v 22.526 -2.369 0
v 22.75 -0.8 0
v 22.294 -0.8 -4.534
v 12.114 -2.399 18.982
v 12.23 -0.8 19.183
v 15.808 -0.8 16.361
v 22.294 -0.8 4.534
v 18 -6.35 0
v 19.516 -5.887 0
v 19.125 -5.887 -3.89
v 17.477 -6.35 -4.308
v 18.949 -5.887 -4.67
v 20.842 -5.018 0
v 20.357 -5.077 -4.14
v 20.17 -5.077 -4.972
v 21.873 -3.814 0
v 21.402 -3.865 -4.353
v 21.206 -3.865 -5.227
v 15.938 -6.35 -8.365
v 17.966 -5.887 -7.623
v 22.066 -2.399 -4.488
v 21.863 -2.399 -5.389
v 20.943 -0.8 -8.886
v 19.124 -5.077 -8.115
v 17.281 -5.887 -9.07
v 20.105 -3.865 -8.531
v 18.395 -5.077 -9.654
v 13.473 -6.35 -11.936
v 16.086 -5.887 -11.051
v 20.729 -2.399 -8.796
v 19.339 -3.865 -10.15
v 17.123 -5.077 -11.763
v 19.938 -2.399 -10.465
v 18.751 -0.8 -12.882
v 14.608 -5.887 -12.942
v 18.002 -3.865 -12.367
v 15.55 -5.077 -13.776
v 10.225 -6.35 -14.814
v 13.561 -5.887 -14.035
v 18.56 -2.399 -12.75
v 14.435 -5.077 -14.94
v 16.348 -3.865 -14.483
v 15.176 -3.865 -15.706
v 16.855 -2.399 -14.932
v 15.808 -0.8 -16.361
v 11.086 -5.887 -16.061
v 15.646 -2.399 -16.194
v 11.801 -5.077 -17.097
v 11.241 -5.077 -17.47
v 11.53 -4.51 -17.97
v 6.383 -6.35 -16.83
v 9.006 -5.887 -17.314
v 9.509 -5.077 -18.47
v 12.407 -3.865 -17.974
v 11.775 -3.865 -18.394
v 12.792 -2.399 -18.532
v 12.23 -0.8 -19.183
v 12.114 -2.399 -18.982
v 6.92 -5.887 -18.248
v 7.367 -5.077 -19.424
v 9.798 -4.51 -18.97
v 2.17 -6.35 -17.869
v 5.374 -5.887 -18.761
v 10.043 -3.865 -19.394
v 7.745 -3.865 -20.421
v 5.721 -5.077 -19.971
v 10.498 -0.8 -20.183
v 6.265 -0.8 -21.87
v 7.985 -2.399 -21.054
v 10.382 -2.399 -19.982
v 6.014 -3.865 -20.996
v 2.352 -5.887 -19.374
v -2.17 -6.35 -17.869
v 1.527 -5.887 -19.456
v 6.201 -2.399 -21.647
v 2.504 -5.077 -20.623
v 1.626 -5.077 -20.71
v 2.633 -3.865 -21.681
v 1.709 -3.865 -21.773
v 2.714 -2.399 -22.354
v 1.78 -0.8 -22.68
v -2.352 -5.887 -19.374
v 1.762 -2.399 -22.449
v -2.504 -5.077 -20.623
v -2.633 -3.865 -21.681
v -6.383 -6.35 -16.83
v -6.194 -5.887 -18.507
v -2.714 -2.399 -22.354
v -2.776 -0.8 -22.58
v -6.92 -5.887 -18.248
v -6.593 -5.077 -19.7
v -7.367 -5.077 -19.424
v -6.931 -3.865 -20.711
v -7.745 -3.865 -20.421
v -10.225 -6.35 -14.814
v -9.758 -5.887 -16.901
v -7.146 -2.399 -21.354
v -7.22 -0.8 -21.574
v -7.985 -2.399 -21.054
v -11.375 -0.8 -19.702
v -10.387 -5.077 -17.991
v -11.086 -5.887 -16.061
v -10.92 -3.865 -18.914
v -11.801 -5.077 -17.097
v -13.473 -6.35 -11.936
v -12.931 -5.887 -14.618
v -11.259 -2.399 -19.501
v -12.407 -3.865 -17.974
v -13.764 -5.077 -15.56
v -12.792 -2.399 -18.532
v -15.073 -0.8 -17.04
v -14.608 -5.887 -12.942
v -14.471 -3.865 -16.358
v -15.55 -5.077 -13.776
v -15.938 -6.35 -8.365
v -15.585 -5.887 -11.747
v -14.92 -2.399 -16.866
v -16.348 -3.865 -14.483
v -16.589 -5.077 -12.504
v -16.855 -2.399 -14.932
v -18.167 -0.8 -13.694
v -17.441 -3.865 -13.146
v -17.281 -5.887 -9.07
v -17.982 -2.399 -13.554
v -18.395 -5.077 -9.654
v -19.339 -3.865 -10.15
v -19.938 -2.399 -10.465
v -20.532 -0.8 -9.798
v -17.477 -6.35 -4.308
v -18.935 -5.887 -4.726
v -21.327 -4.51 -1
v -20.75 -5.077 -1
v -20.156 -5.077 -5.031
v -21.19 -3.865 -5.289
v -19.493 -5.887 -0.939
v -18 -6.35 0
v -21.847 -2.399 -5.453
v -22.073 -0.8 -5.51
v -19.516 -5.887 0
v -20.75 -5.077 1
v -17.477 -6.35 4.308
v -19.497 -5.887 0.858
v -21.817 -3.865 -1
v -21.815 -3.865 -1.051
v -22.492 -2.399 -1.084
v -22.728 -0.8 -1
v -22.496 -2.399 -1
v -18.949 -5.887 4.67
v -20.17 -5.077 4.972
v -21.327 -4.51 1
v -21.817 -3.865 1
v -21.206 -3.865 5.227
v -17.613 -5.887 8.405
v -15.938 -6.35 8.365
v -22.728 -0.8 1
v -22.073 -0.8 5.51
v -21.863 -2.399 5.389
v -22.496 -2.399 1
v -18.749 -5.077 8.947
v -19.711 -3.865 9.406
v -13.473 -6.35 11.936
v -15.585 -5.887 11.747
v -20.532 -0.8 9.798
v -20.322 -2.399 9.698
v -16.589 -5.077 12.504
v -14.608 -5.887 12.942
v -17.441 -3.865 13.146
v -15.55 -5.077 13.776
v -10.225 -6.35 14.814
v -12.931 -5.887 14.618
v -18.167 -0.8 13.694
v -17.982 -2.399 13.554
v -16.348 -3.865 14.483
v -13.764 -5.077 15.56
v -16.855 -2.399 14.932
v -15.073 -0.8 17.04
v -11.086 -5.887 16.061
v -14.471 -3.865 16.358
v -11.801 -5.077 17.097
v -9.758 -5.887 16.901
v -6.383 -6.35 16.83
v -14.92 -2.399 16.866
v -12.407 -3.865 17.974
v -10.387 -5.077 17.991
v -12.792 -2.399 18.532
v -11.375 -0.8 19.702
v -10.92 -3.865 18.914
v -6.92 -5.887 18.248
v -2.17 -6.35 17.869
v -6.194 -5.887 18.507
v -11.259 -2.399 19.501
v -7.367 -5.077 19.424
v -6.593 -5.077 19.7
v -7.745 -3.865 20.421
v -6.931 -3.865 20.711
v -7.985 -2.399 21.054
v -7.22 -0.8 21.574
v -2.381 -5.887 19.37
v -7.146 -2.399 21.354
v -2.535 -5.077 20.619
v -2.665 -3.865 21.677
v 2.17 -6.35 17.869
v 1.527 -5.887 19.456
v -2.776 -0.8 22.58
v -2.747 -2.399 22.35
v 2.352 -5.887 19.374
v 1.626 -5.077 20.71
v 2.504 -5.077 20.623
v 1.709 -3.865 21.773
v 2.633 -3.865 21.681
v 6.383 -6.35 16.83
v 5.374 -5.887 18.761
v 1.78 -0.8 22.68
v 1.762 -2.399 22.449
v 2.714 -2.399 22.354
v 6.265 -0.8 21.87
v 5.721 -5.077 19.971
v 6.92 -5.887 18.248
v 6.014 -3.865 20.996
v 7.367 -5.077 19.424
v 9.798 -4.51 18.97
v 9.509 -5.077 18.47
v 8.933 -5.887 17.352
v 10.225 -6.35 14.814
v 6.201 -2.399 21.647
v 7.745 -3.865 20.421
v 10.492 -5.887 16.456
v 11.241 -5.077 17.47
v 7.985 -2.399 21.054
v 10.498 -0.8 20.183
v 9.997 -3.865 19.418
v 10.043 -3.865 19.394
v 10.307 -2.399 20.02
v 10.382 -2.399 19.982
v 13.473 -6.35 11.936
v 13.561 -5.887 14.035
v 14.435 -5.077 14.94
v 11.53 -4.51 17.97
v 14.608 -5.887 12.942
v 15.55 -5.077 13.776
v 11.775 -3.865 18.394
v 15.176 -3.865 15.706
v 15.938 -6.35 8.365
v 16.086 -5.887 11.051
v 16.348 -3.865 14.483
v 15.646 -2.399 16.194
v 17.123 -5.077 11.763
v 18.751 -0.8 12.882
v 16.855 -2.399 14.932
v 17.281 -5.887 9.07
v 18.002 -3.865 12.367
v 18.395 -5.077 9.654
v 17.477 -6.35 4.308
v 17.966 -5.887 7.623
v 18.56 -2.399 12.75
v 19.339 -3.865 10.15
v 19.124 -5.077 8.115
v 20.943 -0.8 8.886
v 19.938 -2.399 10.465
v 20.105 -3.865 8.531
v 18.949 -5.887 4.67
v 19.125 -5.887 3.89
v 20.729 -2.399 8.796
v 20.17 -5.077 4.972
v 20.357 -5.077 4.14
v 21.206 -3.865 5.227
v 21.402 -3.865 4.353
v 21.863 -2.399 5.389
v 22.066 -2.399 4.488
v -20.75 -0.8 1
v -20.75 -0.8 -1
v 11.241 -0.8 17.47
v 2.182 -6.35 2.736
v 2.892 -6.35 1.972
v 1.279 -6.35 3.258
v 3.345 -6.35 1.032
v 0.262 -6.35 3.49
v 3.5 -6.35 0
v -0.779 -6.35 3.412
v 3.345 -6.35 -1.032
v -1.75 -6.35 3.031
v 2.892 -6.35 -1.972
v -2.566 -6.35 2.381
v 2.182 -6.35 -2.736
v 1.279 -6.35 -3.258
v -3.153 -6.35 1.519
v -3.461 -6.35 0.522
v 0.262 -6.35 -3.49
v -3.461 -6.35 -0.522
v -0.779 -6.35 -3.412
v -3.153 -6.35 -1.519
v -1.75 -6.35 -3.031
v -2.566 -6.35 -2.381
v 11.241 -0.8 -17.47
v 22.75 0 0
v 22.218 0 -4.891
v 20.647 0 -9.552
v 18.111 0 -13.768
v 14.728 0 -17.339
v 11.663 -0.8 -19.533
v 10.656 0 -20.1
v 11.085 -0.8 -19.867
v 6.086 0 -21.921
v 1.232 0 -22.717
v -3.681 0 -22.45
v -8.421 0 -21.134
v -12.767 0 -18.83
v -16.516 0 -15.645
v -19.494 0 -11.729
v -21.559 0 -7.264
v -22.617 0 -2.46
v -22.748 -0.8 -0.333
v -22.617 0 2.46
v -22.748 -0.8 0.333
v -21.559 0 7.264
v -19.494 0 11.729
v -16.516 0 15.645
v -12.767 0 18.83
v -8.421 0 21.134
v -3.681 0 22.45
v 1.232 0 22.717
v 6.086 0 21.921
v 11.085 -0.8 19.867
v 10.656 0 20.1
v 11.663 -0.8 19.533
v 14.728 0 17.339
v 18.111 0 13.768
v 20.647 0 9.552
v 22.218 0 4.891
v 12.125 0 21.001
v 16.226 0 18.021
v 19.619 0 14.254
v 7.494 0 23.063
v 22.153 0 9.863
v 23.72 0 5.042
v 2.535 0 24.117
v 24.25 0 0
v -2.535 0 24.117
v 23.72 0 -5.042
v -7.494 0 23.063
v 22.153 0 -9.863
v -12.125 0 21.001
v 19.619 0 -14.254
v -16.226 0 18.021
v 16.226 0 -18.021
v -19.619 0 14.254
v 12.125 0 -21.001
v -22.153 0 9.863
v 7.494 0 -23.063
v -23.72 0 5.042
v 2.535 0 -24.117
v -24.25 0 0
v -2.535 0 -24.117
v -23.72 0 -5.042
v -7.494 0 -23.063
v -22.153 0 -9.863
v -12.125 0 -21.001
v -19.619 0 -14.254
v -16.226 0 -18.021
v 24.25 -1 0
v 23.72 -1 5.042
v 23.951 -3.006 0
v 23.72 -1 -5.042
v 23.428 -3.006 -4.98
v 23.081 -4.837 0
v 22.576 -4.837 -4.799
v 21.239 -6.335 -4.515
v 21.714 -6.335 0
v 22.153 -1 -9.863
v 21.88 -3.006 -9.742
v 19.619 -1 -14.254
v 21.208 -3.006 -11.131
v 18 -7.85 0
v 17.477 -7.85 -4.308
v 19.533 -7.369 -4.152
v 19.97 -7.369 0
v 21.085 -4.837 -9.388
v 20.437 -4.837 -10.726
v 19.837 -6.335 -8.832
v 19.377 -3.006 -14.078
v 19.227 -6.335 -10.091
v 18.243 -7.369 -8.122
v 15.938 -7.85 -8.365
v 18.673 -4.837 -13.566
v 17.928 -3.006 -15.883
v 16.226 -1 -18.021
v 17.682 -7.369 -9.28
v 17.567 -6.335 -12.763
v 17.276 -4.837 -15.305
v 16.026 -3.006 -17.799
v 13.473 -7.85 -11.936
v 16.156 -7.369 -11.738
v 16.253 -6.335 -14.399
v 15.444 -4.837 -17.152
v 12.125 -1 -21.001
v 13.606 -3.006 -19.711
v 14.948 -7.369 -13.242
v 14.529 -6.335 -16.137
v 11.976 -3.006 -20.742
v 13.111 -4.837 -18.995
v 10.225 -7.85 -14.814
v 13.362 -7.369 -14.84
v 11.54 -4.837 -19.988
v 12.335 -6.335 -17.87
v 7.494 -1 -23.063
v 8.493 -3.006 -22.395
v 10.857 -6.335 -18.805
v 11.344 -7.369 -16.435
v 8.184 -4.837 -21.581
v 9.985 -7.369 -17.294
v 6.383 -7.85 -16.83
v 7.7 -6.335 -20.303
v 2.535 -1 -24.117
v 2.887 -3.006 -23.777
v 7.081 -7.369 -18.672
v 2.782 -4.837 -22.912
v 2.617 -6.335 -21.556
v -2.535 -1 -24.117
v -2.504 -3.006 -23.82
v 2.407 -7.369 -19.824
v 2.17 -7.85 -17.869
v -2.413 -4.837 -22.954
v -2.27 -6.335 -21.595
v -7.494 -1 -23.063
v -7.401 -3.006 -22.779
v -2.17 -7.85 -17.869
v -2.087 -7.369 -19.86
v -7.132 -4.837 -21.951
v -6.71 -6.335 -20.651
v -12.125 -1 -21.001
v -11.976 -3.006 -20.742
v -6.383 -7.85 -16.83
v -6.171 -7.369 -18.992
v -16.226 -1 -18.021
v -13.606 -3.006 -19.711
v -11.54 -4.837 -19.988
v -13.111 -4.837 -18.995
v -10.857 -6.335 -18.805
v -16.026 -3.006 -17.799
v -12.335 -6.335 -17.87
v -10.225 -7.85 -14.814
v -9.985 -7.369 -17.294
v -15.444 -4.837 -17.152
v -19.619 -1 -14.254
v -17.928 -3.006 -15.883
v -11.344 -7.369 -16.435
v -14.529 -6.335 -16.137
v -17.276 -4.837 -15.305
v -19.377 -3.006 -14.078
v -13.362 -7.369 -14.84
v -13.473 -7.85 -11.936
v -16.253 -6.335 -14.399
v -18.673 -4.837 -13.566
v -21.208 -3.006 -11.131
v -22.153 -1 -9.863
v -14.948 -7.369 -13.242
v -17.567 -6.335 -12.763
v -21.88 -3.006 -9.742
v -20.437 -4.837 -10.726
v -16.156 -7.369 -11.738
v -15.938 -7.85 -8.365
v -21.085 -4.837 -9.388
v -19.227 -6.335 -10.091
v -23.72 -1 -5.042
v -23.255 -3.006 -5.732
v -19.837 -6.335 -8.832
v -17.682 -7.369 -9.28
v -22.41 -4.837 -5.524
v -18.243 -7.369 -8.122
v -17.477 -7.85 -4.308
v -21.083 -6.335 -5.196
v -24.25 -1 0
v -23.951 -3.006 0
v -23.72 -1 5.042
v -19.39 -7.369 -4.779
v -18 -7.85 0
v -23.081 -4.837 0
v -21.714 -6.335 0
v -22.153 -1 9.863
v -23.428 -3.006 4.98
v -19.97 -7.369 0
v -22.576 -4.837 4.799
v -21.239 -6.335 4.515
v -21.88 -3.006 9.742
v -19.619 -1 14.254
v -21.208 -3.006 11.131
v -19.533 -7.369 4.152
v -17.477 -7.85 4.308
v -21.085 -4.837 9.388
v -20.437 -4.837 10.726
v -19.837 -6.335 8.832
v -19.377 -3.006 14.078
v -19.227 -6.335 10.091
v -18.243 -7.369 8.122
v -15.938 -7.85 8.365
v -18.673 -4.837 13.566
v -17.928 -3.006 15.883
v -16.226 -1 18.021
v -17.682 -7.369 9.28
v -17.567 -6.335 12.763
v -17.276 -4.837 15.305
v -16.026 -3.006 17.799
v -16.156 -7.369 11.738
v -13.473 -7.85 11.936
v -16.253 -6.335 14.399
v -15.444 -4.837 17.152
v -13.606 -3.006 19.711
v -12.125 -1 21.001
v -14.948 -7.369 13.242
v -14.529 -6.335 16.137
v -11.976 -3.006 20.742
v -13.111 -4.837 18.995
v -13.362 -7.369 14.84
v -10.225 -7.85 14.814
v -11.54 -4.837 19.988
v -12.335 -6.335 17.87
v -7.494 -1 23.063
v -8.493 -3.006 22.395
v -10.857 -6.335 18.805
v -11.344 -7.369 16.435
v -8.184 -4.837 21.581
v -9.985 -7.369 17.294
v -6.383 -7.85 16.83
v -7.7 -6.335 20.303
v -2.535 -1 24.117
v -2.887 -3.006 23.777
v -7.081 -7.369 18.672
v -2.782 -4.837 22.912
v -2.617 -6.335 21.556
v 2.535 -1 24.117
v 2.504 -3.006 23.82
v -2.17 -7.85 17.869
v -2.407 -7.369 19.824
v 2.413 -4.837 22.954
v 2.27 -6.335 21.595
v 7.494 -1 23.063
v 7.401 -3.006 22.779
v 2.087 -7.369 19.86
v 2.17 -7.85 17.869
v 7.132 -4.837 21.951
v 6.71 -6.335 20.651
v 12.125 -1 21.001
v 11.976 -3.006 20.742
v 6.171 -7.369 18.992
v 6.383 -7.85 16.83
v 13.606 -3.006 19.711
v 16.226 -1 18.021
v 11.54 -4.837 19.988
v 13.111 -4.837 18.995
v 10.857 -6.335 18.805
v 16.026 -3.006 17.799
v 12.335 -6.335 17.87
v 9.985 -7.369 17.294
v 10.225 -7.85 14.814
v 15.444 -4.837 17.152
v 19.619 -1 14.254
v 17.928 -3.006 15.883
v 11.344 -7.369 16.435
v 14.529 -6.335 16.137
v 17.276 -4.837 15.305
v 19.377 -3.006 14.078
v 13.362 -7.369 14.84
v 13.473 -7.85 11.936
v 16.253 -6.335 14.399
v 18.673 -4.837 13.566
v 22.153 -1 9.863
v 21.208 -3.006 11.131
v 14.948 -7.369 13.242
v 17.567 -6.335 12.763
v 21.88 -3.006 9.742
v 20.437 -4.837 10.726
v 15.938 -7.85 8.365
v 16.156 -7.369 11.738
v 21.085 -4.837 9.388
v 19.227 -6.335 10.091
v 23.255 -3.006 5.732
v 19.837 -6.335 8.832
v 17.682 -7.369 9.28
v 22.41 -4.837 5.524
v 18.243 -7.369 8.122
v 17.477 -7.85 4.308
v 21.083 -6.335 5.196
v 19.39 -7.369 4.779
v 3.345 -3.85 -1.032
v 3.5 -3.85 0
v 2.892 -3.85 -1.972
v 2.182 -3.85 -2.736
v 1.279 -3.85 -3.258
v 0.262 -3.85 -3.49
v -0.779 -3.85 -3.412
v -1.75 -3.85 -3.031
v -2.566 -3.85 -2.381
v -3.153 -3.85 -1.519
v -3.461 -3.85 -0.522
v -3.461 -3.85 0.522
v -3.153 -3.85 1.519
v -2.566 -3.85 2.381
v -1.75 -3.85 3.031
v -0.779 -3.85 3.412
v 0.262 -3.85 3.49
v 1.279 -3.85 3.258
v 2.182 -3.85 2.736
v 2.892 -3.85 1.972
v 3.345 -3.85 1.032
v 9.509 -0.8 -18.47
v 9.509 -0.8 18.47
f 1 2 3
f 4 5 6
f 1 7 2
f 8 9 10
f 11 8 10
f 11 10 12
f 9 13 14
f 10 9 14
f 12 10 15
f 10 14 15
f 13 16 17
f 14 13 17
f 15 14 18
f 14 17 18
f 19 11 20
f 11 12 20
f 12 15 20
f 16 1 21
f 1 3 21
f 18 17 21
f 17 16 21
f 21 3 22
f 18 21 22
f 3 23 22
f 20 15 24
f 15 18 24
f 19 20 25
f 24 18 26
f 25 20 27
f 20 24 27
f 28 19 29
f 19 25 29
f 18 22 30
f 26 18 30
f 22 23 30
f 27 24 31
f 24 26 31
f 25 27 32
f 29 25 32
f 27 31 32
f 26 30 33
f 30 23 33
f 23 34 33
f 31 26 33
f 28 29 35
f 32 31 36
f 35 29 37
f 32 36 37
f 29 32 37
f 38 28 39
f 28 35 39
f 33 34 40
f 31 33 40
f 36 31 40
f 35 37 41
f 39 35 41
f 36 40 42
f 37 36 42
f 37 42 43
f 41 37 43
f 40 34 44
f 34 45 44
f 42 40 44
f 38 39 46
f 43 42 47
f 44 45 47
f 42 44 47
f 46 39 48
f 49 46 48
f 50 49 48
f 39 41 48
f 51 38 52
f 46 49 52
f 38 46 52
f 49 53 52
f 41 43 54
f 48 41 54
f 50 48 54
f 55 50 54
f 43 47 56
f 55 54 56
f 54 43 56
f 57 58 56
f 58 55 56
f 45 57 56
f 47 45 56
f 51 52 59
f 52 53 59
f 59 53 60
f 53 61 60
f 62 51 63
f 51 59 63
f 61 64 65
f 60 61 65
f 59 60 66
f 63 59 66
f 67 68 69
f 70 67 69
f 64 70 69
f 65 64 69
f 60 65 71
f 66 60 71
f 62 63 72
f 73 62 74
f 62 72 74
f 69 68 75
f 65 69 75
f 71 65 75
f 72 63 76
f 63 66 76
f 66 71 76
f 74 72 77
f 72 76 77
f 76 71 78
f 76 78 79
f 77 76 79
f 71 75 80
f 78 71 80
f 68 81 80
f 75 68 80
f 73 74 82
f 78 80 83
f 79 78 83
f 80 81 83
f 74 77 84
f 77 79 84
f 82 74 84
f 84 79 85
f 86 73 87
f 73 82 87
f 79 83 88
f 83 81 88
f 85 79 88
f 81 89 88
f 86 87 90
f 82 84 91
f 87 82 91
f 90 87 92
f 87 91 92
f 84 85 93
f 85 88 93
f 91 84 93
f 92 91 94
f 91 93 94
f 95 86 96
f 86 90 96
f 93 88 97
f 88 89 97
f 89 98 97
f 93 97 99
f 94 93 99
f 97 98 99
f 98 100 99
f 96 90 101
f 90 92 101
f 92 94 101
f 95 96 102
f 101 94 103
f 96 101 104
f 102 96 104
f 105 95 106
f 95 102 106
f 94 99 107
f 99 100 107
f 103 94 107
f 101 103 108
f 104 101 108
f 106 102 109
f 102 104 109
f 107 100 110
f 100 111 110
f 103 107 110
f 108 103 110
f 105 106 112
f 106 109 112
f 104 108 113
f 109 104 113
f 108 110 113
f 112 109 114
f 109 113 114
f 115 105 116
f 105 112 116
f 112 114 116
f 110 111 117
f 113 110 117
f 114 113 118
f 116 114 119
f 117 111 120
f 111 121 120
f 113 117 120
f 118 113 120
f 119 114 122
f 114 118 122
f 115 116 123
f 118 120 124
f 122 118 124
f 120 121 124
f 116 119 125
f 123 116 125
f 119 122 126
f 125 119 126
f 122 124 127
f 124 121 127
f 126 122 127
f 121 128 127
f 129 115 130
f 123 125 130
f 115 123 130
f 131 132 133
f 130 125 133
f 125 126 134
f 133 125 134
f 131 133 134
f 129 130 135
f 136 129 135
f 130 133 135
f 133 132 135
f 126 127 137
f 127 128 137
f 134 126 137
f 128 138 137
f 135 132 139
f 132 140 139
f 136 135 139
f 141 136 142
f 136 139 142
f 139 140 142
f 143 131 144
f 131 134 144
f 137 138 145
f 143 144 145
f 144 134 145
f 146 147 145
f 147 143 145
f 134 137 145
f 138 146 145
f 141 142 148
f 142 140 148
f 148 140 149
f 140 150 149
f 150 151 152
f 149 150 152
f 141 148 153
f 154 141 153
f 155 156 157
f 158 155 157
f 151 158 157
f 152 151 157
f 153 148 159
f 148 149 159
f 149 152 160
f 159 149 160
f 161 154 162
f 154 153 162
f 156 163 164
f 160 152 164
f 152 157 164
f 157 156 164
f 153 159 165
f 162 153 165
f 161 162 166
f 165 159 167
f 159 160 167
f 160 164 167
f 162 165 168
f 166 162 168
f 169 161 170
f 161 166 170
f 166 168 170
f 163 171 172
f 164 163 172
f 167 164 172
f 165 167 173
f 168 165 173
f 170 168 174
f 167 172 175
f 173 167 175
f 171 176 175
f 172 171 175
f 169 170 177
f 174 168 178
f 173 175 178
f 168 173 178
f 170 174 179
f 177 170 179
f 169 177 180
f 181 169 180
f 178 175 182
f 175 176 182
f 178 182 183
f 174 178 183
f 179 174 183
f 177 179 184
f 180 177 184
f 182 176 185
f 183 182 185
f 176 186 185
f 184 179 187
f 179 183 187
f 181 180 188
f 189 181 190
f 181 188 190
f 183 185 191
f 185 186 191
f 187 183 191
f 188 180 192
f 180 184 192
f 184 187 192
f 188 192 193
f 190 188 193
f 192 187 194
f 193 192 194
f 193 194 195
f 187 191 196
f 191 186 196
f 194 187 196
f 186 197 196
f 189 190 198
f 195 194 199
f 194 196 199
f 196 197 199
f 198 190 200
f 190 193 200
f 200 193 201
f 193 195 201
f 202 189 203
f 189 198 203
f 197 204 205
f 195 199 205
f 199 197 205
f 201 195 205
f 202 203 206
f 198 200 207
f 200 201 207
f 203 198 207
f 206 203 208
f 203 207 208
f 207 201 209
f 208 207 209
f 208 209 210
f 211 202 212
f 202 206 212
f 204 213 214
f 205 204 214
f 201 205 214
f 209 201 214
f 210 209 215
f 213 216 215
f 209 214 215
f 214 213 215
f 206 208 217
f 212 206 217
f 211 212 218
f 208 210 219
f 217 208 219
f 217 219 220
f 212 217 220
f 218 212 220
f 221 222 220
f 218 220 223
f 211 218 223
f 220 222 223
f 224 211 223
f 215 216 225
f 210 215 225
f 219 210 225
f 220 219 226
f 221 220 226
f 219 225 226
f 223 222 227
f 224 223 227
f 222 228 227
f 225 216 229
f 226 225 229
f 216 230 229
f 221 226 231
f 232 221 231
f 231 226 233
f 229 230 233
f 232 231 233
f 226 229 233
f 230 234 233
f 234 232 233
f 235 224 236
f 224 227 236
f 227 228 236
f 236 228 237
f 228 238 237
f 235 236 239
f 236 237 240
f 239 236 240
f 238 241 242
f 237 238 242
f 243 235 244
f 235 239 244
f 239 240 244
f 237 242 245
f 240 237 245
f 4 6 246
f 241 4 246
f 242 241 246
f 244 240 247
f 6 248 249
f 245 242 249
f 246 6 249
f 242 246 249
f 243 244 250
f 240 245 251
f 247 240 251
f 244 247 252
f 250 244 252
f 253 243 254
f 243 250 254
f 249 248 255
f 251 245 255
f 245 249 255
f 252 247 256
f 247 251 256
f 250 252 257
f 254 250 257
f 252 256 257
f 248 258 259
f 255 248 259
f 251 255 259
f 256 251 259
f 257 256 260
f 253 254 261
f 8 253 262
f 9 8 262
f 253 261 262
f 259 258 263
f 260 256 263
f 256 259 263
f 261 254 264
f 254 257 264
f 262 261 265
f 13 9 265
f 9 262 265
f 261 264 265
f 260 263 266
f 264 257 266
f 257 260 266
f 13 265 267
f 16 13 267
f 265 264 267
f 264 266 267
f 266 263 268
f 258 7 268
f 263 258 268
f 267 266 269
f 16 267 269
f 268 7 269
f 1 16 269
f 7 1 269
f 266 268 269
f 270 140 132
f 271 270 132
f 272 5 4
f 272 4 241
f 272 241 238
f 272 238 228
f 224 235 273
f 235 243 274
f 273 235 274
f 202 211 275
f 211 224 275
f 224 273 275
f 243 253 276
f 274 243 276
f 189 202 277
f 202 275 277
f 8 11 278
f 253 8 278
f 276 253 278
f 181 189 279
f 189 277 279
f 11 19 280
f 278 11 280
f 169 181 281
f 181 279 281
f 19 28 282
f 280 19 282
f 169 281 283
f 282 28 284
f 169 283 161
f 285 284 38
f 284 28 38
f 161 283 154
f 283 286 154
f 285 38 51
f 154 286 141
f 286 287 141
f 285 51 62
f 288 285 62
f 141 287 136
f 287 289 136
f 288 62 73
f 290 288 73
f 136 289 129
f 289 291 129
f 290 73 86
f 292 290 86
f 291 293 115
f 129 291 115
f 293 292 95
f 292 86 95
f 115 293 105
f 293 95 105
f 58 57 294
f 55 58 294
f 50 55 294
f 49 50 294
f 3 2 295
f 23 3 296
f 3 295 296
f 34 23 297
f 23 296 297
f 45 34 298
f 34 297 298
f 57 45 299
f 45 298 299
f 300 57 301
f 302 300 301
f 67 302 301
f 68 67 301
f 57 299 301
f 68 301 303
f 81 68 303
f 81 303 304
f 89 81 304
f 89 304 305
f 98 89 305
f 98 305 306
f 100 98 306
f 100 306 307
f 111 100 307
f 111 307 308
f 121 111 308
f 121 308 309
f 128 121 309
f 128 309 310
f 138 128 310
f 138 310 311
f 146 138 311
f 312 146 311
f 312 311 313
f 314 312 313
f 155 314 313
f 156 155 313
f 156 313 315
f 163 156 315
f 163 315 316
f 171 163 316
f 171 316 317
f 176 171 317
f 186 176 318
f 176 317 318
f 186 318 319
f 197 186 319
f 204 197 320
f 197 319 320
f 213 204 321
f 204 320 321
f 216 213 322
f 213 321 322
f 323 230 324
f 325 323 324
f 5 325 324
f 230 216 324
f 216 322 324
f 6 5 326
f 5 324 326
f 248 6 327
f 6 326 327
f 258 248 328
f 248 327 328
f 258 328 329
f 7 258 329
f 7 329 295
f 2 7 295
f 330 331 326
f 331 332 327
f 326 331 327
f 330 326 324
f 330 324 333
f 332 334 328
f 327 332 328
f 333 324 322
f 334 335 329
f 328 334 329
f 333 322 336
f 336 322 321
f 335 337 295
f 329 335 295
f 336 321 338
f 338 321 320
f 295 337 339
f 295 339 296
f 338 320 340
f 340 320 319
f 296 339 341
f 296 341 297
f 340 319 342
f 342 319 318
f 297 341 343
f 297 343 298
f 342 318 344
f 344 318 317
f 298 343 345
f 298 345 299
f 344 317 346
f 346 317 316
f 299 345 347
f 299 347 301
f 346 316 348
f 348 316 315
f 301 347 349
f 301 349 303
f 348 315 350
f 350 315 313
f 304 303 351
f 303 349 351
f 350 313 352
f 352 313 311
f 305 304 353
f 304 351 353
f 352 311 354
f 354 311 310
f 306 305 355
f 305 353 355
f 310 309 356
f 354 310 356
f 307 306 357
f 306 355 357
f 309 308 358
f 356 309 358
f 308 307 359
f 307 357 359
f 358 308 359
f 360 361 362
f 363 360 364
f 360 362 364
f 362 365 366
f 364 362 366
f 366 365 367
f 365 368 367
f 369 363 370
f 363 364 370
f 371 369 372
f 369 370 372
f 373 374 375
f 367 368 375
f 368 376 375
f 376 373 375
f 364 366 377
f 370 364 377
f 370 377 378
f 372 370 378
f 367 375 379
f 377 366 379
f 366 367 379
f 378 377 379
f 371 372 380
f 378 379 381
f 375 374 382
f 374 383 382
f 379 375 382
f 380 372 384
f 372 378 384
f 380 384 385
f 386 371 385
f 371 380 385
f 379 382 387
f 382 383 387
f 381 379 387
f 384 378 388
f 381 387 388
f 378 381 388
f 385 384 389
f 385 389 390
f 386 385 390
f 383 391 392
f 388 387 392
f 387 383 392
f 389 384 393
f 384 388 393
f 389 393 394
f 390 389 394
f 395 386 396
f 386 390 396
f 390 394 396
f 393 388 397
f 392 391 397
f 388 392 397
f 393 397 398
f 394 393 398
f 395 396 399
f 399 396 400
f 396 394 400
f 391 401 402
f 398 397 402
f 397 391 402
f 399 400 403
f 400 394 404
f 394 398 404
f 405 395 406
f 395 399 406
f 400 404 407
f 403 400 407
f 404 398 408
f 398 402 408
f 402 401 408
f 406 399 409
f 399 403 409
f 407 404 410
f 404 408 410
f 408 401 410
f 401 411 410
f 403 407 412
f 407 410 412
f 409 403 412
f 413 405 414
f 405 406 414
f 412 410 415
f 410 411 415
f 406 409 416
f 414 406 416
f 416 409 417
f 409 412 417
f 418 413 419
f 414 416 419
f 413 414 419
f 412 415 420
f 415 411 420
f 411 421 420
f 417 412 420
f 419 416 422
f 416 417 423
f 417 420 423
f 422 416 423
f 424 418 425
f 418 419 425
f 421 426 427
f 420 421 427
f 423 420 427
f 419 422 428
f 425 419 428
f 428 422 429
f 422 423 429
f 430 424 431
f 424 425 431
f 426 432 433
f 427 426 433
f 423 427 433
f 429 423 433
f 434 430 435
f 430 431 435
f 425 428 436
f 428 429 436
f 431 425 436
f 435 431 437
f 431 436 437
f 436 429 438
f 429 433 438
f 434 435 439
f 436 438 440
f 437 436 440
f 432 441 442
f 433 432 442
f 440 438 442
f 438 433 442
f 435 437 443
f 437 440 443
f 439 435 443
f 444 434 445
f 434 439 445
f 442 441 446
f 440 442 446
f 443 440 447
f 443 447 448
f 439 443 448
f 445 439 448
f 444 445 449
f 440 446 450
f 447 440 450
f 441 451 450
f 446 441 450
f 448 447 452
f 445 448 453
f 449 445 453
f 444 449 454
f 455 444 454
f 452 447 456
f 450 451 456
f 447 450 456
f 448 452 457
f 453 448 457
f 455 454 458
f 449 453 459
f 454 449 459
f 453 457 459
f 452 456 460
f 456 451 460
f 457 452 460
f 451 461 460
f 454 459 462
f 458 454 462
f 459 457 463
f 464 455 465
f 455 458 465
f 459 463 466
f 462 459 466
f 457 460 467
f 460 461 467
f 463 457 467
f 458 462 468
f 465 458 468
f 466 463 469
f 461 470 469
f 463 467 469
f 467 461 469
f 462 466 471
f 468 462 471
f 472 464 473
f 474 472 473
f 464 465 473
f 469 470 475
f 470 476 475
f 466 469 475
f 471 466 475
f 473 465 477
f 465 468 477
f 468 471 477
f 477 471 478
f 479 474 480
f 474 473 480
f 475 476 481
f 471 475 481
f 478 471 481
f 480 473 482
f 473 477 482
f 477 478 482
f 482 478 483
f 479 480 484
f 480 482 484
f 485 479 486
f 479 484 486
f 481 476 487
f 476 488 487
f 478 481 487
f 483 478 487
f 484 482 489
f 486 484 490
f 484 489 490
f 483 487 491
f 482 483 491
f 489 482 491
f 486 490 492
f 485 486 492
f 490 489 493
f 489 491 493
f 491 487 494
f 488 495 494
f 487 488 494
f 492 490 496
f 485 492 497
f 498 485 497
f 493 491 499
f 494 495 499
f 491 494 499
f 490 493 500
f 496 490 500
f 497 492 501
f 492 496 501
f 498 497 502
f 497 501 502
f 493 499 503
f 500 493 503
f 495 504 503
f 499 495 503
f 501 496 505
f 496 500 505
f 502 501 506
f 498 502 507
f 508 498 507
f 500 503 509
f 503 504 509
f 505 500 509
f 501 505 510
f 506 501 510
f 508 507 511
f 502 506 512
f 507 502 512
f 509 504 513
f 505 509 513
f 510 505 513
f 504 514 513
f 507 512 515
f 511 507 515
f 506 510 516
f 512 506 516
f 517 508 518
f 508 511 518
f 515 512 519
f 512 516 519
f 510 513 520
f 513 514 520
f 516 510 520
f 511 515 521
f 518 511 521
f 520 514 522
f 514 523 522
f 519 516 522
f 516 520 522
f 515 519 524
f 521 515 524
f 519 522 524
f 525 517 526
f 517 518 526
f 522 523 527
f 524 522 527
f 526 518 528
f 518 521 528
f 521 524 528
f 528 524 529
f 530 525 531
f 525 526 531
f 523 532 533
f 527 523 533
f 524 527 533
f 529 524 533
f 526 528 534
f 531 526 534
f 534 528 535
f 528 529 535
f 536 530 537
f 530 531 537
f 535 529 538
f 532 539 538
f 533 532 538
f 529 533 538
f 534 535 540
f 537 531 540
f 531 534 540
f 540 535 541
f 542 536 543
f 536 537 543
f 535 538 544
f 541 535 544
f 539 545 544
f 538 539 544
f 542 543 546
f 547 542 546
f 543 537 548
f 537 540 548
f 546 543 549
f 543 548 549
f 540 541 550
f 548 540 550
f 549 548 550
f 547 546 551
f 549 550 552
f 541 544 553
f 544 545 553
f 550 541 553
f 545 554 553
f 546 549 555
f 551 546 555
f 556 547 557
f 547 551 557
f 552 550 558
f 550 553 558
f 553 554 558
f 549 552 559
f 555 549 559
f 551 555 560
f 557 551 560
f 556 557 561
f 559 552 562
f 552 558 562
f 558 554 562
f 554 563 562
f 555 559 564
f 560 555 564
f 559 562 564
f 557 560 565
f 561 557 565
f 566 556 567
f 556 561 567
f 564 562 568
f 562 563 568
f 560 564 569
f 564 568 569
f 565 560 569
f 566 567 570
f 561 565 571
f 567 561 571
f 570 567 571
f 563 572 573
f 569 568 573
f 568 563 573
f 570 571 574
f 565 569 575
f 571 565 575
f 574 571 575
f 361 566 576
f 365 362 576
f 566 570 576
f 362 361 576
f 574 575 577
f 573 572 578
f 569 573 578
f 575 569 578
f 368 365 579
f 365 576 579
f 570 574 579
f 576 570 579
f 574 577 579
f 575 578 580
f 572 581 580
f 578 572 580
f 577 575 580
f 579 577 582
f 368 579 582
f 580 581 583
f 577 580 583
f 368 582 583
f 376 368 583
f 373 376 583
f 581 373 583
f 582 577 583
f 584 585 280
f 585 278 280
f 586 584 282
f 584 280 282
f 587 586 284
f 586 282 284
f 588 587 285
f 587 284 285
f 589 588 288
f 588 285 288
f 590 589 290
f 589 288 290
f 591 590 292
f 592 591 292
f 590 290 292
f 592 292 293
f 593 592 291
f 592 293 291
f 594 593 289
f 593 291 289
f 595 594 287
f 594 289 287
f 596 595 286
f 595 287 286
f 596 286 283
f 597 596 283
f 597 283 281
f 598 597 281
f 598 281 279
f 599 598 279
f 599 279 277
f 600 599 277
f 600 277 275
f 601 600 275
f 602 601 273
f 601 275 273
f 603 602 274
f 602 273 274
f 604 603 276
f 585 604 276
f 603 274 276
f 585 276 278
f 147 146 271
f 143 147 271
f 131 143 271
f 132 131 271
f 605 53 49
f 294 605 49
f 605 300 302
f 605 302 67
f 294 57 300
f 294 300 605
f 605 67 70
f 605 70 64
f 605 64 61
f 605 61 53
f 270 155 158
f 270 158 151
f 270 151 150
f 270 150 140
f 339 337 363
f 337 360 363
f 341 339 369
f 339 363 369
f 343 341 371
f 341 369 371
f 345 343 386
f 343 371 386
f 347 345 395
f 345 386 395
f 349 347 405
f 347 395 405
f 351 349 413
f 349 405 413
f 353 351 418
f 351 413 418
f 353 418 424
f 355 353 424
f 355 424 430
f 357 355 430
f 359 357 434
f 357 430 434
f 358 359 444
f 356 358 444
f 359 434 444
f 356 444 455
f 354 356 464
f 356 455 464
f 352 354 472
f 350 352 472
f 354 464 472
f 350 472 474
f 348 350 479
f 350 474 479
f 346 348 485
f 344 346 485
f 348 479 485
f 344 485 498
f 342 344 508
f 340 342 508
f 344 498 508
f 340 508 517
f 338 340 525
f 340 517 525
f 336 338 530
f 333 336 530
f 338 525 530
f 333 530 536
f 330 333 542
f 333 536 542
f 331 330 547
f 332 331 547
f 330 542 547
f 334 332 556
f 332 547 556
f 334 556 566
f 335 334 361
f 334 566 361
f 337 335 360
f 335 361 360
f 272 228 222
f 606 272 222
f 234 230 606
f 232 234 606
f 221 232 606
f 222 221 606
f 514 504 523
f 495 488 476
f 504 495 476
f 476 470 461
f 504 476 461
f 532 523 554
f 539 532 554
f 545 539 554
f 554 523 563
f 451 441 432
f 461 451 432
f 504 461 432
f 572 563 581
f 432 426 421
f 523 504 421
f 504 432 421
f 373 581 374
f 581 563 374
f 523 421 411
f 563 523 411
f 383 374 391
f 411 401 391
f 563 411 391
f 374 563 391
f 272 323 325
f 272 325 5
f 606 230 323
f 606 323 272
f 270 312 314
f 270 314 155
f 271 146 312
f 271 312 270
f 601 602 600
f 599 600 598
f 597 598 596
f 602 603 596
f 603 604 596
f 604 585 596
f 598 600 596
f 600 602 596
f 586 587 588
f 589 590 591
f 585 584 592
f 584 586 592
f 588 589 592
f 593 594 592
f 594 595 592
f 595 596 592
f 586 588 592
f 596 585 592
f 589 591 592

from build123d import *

# Parameters (mm, degrees)
BOSS_EXTRUDE2_REACH            = 37.012
BOSS_EXTRUDE2_END_MAJOR_RADIUS = 17.132631579
BOSS_EXTRUDE2_END_MINOR_RADIUS = 5.617368421
SKETCH4_W                      = 2
SKETCH4_H                      = 2
CIRPATTERN2_COUNT              = 3


with BuildPart() as part:
    # Sketch3 → Revolve1 (revolve)
    with BuildSketch(Plane.XY, mode=Mode.PRIVATE) as revolve1_sk:
        with BuildLine():
            Line((-24.25, 0), (-24.25, -1))
            ThreePointArc((-24.25, -1), (-22.452699724, -5.636404857), (-18, -7.85))
            Line((-18, -7.85), (0, -7.85))
            Line((0, -7.85), (0, -3.85))
            Line((0, -3.85), (-3.5, -3.85))
            Line((-3.5, -3.85), (-3.5, -6.35))
            Line((-3.5, -6.35), (-18, -6.35))
            ThreePointArc((-18, -6.35), (-21.400368447, -4.45256759), (-22.75, -0.8))
            Line((-22.75, -0.8), (-22.75, 0))
            Line((-22.75, 0), (-24.25, 0))
        make_face()
    revolve(revolve1_sk.sketch.rotate(Axis((0, -13.198525541, 0), (0, 1, 0)), 180), axis=Axis((0, -13.198525541, 0), (0, 1, 0)))

    # Boss-Extrude2: up to this torus (the profile starts inside it)
    boss_extrude2_end = Plane(origin=(0, -0.8, 0), z_dir=(0, -1, 0)) * Torus(BOSS_EXTRUDE2_END_MAJOR_RADIUS, BOSS_EXTRUDE2_END_MINOR_RADIUS, mode=Mode.PRIVATE)
    # Sketch4 → Boss-Extrude2 (add, up to the surface)
    with BuildSketch(Plane(origin=(0, -0.8, 0), x_dir=(1, 0, 0), z_dir=(0, 1, 0)), mode=Mode.PRIVATE) as boss_extrude2_sk1:
        with Locations((-21.75, 0)):
            Rectangle(SKETCH4_W, SKETCH4_H)
    boss_extrude2_tool1 = extrude(boss_extrude2_sk1.sketch, amount=-BOSS_EXTRUDE2_REACH, mode=Mode.PRIVATE) & boss_extrude2_end
    boss_extrude2 = boss_extrude2_tool1.solids().sort_by_distance((-21.75, -0.8, 0))[0]
    add(boss_extrude2)

    # CirPattern2: Boss-Extrude2 ×3 about axis
    cirpattern2_axis = Axis((0, 0, 0), (0, 1, 0))
    for i in range(1, CIRPATTERN2_COUNT):
        add(boss_extrude2.rotate(cirpattern2_axis, i * 360 / CIRPATTERN2_COUNT))


solid = part.part
